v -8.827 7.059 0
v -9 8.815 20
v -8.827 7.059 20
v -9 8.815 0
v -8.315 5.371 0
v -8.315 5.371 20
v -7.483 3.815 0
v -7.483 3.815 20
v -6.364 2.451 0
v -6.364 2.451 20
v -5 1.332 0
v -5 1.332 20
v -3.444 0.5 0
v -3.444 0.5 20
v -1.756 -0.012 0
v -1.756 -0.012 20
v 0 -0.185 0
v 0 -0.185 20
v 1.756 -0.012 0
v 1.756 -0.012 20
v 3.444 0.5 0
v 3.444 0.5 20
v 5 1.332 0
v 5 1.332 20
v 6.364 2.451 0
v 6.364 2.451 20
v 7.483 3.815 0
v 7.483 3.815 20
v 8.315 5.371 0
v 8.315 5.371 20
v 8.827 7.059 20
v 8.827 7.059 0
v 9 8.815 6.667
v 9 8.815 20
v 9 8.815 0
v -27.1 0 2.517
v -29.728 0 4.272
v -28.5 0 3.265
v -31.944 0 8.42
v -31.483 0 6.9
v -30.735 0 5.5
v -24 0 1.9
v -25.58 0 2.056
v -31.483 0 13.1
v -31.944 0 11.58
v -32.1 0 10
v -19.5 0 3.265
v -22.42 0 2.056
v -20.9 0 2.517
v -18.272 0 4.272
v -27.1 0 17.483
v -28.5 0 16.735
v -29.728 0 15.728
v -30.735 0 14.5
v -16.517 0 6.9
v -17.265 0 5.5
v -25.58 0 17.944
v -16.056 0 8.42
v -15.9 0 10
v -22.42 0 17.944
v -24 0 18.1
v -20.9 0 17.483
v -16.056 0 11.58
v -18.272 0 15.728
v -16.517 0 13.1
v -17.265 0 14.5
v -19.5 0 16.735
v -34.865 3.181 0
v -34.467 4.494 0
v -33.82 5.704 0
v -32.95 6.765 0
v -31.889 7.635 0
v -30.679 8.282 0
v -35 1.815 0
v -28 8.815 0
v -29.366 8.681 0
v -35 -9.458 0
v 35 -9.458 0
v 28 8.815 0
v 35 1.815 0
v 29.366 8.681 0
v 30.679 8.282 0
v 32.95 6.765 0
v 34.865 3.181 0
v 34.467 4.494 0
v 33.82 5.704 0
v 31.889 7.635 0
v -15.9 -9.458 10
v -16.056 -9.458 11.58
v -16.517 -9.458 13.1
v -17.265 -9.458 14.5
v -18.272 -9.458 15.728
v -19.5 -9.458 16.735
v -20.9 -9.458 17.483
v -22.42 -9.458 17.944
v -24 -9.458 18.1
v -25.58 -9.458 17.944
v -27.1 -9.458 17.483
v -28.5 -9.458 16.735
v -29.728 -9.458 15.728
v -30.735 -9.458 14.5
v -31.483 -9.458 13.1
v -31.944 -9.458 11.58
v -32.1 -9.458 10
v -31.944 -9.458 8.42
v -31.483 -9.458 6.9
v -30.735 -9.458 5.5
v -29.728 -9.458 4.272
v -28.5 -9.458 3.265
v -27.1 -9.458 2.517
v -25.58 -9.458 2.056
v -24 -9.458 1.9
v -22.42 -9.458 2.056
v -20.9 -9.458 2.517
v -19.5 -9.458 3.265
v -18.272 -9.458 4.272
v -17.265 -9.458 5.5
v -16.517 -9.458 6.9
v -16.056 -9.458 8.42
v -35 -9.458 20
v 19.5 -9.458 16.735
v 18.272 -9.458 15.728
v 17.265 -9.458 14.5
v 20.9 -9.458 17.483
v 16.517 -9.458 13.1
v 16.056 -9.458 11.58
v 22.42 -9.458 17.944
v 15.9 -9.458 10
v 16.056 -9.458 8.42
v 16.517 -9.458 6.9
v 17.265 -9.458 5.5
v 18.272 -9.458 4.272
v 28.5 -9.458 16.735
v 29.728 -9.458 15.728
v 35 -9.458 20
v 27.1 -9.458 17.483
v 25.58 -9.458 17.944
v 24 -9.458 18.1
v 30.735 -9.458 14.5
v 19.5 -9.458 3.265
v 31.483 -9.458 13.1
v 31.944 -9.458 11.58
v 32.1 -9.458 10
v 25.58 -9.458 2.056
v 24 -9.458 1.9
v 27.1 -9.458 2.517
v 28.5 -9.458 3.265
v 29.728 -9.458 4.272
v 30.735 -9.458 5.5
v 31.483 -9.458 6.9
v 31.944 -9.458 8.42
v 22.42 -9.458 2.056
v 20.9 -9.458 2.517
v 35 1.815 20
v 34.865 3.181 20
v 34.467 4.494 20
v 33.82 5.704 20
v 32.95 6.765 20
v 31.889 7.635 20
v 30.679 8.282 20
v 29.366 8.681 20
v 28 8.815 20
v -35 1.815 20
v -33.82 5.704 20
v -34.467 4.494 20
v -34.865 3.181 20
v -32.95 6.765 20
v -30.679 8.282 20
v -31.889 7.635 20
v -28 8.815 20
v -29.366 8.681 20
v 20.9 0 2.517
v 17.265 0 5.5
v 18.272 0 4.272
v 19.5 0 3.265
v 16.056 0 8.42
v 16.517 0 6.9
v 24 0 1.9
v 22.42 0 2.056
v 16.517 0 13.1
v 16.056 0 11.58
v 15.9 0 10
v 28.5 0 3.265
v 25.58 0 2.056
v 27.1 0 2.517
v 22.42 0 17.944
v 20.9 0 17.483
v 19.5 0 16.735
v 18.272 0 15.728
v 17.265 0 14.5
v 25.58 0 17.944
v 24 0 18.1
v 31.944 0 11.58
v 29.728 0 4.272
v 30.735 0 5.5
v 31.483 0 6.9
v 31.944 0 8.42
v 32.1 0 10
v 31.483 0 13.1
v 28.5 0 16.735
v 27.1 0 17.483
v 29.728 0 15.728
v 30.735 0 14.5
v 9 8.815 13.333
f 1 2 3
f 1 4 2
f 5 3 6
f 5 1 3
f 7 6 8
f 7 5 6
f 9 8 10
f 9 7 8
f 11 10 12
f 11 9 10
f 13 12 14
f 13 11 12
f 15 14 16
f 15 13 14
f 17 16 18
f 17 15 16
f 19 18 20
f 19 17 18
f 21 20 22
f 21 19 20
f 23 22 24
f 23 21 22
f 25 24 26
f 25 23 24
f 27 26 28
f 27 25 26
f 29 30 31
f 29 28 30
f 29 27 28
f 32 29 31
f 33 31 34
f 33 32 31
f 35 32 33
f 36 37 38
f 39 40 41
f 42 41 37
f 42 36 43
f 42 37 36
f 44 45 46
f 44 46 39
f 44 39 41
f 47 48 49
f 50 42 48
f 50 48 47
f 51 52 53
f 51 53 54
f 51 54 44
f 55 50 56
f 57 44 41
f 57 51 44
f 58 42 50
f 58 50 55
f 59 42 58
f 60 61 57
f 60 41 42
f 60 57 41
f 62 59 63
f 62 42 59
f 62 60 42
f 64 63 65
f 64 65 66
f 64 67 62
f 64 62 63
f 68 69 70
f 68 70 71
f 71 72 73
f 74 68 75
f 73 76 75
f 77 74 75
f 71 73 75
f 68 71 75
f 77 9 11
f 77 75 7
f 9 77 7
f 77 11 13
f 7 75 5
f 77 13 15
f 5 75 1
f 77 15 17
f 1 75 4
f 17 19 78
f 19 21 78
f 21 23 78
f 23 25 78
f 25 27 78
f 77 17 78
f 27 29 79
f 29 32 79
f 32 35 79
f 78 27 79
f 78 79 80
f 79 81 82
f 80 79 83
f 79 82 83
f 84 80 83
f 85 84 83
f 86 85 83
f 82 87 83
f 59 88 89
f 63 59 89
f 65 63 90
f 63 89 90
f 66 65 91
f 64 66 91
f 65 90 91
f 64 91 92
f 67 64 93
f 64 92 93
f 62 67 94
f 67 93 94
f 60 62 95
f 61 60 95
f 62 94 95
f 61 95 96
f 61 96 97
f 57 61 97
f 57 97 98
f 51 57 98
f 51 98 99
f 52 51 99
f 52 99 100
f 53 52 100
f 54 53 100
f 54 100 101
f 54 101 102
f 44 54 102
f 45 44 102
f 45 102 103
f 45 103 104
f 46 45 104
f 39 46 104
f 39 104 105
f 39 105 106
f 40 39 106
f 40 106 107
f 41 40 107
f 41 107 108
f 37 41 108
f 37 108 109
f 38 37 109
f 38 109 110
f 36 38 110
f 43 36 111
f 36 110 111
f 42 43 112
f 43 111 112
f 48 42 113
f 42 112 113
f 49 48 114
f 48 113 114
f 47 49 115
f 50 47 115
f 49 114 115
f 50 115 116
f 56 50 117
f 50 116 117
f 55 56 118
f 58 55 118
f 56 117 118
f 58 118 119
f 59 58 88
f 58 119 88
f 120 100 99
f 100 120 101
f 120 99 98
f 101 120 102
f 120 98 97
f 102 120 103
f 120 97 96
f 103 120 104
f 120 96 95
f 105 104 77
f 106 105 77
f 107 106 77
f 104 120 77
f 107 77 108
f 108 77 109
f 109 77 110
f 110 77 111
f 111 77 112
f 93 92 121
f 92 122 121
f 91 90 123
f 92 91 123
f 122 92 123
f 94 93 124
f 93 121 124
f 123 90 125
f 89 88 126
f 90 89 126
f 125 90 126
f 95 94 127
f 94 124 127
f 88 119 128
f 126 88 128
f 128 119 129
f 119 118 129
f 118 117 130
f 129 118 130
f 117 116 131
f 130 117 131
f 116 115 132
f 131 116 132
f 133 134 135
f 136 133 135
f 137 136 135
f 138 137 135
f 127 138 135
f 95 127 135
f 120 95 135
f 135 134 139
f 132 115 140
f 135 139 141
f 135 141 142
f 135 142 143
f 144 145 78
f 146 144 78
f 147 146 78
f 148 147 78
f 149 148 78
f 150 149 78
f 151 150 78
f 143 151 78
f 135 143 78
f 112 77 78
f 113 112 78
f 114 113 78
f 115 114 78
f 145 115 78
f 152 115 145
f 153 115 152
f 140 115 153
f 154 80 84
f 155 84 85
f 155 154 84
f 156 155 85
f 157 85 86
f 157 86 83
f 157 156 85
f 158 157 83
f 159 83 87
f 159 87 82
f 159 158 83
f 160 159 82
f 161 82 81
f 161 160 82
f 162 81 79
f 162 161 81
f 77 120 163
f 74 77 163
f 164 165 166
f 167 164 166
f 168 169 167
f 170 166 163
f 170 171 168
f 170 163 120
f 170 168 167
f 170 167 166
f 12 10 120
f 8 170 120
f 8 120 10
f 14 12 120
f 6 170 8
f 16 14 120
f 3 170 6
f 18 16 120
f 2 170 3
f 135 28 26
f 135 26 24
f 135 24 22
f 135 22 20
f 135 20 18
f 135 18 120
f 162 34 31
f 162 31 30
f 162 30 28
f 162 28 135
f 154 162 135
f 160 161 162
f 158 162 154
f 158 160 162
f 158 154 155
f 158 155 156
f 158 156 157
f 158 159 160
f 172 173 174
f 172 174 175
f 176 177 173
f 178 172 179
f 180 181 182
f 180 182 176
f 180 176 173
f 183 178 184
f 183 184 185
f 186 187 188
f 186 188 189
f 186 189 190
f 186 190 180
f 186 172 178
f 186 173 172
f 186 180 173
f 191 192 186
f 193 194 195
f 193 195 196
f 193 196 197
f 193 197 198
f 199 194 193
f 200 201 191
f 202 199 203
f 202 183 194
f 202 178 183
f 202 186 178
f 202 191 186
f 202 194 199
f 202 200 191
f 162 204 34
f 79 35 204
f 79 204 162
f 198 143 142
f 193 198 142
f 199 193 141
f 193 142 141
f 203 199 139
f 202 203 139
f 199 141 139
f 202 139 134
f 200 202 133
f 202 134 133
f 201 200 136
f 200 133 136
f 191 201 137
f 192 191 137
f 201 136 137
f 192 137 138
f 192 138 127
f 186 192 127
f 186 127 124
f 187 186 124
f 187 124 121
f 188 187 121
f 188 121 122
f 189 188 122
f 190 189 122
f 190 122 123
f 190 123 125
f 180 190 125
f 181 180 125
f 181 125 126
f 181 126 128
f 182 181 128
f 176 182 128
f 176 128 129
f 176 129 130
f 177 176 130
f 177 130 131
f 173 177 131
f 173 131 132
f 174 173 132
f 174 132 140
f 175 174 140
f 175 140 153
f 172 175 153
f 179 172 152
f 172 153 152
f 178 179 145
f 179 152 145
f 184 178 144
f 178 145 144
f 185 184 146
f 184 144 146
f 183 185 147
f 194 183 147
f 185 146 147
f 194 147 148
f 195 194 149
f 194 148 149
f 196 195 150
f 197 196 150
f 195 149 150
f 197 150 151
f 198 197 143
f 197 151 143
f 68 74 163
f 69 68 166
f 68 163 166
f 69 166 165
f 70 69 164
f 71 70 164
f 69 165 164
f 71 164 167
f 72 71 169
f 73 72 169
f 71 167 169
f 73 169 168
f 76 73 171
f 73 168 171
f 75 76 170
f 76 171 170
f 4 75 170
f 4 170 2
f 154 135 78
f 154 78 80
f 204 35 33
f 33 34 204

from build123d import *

# Parameters (mm, degrees)
F0_W     = 70
F0_H     = 18.273093
F1_DEPTH = 20
F3_R     = 8.1
F4_DEPTH = 10
F5_R     = 9
F6_DEPTH = 25
F7_R     = 7


with BuildPart() as f1:
    # F0 (on Top) → F1 (new body)
    with BuildSketch(Plane.XY):
        with Locations((0, -0.321428)):
            Rectangle(F0_W, F0_H)
    extrude(amount=F1_DEPTH)

    # F3 (on offset) → F4 (cut)
    with BuildSketch(Plane.XZ.offset(10)):
        with Locations((-24, 10)):
            Circle(F3_R)
        with Locations((24, 10)):
            Circle(F3_R)
    extrude(amount=-F4_DEPTH, mode=Mode.SUBTRACT)

    # F5 (on Top) → F6 (cut)
    with BuildSketch(Plane.XY):
        with Locations((0, 8.815118)):
            Circle(F5_R)
    extrude(amount=F6_DEPTH, mode=Mode.SUBTRACT)

    # F7
    f7_edges = [f1.edges().sort_by_distance(p)[0] for p in [
        (35, 8.815118, 10),
        (-35, 8.815118, 10),
    ]]
    fillet(f7_edges, radius=F7_R)


solid = f1.part
